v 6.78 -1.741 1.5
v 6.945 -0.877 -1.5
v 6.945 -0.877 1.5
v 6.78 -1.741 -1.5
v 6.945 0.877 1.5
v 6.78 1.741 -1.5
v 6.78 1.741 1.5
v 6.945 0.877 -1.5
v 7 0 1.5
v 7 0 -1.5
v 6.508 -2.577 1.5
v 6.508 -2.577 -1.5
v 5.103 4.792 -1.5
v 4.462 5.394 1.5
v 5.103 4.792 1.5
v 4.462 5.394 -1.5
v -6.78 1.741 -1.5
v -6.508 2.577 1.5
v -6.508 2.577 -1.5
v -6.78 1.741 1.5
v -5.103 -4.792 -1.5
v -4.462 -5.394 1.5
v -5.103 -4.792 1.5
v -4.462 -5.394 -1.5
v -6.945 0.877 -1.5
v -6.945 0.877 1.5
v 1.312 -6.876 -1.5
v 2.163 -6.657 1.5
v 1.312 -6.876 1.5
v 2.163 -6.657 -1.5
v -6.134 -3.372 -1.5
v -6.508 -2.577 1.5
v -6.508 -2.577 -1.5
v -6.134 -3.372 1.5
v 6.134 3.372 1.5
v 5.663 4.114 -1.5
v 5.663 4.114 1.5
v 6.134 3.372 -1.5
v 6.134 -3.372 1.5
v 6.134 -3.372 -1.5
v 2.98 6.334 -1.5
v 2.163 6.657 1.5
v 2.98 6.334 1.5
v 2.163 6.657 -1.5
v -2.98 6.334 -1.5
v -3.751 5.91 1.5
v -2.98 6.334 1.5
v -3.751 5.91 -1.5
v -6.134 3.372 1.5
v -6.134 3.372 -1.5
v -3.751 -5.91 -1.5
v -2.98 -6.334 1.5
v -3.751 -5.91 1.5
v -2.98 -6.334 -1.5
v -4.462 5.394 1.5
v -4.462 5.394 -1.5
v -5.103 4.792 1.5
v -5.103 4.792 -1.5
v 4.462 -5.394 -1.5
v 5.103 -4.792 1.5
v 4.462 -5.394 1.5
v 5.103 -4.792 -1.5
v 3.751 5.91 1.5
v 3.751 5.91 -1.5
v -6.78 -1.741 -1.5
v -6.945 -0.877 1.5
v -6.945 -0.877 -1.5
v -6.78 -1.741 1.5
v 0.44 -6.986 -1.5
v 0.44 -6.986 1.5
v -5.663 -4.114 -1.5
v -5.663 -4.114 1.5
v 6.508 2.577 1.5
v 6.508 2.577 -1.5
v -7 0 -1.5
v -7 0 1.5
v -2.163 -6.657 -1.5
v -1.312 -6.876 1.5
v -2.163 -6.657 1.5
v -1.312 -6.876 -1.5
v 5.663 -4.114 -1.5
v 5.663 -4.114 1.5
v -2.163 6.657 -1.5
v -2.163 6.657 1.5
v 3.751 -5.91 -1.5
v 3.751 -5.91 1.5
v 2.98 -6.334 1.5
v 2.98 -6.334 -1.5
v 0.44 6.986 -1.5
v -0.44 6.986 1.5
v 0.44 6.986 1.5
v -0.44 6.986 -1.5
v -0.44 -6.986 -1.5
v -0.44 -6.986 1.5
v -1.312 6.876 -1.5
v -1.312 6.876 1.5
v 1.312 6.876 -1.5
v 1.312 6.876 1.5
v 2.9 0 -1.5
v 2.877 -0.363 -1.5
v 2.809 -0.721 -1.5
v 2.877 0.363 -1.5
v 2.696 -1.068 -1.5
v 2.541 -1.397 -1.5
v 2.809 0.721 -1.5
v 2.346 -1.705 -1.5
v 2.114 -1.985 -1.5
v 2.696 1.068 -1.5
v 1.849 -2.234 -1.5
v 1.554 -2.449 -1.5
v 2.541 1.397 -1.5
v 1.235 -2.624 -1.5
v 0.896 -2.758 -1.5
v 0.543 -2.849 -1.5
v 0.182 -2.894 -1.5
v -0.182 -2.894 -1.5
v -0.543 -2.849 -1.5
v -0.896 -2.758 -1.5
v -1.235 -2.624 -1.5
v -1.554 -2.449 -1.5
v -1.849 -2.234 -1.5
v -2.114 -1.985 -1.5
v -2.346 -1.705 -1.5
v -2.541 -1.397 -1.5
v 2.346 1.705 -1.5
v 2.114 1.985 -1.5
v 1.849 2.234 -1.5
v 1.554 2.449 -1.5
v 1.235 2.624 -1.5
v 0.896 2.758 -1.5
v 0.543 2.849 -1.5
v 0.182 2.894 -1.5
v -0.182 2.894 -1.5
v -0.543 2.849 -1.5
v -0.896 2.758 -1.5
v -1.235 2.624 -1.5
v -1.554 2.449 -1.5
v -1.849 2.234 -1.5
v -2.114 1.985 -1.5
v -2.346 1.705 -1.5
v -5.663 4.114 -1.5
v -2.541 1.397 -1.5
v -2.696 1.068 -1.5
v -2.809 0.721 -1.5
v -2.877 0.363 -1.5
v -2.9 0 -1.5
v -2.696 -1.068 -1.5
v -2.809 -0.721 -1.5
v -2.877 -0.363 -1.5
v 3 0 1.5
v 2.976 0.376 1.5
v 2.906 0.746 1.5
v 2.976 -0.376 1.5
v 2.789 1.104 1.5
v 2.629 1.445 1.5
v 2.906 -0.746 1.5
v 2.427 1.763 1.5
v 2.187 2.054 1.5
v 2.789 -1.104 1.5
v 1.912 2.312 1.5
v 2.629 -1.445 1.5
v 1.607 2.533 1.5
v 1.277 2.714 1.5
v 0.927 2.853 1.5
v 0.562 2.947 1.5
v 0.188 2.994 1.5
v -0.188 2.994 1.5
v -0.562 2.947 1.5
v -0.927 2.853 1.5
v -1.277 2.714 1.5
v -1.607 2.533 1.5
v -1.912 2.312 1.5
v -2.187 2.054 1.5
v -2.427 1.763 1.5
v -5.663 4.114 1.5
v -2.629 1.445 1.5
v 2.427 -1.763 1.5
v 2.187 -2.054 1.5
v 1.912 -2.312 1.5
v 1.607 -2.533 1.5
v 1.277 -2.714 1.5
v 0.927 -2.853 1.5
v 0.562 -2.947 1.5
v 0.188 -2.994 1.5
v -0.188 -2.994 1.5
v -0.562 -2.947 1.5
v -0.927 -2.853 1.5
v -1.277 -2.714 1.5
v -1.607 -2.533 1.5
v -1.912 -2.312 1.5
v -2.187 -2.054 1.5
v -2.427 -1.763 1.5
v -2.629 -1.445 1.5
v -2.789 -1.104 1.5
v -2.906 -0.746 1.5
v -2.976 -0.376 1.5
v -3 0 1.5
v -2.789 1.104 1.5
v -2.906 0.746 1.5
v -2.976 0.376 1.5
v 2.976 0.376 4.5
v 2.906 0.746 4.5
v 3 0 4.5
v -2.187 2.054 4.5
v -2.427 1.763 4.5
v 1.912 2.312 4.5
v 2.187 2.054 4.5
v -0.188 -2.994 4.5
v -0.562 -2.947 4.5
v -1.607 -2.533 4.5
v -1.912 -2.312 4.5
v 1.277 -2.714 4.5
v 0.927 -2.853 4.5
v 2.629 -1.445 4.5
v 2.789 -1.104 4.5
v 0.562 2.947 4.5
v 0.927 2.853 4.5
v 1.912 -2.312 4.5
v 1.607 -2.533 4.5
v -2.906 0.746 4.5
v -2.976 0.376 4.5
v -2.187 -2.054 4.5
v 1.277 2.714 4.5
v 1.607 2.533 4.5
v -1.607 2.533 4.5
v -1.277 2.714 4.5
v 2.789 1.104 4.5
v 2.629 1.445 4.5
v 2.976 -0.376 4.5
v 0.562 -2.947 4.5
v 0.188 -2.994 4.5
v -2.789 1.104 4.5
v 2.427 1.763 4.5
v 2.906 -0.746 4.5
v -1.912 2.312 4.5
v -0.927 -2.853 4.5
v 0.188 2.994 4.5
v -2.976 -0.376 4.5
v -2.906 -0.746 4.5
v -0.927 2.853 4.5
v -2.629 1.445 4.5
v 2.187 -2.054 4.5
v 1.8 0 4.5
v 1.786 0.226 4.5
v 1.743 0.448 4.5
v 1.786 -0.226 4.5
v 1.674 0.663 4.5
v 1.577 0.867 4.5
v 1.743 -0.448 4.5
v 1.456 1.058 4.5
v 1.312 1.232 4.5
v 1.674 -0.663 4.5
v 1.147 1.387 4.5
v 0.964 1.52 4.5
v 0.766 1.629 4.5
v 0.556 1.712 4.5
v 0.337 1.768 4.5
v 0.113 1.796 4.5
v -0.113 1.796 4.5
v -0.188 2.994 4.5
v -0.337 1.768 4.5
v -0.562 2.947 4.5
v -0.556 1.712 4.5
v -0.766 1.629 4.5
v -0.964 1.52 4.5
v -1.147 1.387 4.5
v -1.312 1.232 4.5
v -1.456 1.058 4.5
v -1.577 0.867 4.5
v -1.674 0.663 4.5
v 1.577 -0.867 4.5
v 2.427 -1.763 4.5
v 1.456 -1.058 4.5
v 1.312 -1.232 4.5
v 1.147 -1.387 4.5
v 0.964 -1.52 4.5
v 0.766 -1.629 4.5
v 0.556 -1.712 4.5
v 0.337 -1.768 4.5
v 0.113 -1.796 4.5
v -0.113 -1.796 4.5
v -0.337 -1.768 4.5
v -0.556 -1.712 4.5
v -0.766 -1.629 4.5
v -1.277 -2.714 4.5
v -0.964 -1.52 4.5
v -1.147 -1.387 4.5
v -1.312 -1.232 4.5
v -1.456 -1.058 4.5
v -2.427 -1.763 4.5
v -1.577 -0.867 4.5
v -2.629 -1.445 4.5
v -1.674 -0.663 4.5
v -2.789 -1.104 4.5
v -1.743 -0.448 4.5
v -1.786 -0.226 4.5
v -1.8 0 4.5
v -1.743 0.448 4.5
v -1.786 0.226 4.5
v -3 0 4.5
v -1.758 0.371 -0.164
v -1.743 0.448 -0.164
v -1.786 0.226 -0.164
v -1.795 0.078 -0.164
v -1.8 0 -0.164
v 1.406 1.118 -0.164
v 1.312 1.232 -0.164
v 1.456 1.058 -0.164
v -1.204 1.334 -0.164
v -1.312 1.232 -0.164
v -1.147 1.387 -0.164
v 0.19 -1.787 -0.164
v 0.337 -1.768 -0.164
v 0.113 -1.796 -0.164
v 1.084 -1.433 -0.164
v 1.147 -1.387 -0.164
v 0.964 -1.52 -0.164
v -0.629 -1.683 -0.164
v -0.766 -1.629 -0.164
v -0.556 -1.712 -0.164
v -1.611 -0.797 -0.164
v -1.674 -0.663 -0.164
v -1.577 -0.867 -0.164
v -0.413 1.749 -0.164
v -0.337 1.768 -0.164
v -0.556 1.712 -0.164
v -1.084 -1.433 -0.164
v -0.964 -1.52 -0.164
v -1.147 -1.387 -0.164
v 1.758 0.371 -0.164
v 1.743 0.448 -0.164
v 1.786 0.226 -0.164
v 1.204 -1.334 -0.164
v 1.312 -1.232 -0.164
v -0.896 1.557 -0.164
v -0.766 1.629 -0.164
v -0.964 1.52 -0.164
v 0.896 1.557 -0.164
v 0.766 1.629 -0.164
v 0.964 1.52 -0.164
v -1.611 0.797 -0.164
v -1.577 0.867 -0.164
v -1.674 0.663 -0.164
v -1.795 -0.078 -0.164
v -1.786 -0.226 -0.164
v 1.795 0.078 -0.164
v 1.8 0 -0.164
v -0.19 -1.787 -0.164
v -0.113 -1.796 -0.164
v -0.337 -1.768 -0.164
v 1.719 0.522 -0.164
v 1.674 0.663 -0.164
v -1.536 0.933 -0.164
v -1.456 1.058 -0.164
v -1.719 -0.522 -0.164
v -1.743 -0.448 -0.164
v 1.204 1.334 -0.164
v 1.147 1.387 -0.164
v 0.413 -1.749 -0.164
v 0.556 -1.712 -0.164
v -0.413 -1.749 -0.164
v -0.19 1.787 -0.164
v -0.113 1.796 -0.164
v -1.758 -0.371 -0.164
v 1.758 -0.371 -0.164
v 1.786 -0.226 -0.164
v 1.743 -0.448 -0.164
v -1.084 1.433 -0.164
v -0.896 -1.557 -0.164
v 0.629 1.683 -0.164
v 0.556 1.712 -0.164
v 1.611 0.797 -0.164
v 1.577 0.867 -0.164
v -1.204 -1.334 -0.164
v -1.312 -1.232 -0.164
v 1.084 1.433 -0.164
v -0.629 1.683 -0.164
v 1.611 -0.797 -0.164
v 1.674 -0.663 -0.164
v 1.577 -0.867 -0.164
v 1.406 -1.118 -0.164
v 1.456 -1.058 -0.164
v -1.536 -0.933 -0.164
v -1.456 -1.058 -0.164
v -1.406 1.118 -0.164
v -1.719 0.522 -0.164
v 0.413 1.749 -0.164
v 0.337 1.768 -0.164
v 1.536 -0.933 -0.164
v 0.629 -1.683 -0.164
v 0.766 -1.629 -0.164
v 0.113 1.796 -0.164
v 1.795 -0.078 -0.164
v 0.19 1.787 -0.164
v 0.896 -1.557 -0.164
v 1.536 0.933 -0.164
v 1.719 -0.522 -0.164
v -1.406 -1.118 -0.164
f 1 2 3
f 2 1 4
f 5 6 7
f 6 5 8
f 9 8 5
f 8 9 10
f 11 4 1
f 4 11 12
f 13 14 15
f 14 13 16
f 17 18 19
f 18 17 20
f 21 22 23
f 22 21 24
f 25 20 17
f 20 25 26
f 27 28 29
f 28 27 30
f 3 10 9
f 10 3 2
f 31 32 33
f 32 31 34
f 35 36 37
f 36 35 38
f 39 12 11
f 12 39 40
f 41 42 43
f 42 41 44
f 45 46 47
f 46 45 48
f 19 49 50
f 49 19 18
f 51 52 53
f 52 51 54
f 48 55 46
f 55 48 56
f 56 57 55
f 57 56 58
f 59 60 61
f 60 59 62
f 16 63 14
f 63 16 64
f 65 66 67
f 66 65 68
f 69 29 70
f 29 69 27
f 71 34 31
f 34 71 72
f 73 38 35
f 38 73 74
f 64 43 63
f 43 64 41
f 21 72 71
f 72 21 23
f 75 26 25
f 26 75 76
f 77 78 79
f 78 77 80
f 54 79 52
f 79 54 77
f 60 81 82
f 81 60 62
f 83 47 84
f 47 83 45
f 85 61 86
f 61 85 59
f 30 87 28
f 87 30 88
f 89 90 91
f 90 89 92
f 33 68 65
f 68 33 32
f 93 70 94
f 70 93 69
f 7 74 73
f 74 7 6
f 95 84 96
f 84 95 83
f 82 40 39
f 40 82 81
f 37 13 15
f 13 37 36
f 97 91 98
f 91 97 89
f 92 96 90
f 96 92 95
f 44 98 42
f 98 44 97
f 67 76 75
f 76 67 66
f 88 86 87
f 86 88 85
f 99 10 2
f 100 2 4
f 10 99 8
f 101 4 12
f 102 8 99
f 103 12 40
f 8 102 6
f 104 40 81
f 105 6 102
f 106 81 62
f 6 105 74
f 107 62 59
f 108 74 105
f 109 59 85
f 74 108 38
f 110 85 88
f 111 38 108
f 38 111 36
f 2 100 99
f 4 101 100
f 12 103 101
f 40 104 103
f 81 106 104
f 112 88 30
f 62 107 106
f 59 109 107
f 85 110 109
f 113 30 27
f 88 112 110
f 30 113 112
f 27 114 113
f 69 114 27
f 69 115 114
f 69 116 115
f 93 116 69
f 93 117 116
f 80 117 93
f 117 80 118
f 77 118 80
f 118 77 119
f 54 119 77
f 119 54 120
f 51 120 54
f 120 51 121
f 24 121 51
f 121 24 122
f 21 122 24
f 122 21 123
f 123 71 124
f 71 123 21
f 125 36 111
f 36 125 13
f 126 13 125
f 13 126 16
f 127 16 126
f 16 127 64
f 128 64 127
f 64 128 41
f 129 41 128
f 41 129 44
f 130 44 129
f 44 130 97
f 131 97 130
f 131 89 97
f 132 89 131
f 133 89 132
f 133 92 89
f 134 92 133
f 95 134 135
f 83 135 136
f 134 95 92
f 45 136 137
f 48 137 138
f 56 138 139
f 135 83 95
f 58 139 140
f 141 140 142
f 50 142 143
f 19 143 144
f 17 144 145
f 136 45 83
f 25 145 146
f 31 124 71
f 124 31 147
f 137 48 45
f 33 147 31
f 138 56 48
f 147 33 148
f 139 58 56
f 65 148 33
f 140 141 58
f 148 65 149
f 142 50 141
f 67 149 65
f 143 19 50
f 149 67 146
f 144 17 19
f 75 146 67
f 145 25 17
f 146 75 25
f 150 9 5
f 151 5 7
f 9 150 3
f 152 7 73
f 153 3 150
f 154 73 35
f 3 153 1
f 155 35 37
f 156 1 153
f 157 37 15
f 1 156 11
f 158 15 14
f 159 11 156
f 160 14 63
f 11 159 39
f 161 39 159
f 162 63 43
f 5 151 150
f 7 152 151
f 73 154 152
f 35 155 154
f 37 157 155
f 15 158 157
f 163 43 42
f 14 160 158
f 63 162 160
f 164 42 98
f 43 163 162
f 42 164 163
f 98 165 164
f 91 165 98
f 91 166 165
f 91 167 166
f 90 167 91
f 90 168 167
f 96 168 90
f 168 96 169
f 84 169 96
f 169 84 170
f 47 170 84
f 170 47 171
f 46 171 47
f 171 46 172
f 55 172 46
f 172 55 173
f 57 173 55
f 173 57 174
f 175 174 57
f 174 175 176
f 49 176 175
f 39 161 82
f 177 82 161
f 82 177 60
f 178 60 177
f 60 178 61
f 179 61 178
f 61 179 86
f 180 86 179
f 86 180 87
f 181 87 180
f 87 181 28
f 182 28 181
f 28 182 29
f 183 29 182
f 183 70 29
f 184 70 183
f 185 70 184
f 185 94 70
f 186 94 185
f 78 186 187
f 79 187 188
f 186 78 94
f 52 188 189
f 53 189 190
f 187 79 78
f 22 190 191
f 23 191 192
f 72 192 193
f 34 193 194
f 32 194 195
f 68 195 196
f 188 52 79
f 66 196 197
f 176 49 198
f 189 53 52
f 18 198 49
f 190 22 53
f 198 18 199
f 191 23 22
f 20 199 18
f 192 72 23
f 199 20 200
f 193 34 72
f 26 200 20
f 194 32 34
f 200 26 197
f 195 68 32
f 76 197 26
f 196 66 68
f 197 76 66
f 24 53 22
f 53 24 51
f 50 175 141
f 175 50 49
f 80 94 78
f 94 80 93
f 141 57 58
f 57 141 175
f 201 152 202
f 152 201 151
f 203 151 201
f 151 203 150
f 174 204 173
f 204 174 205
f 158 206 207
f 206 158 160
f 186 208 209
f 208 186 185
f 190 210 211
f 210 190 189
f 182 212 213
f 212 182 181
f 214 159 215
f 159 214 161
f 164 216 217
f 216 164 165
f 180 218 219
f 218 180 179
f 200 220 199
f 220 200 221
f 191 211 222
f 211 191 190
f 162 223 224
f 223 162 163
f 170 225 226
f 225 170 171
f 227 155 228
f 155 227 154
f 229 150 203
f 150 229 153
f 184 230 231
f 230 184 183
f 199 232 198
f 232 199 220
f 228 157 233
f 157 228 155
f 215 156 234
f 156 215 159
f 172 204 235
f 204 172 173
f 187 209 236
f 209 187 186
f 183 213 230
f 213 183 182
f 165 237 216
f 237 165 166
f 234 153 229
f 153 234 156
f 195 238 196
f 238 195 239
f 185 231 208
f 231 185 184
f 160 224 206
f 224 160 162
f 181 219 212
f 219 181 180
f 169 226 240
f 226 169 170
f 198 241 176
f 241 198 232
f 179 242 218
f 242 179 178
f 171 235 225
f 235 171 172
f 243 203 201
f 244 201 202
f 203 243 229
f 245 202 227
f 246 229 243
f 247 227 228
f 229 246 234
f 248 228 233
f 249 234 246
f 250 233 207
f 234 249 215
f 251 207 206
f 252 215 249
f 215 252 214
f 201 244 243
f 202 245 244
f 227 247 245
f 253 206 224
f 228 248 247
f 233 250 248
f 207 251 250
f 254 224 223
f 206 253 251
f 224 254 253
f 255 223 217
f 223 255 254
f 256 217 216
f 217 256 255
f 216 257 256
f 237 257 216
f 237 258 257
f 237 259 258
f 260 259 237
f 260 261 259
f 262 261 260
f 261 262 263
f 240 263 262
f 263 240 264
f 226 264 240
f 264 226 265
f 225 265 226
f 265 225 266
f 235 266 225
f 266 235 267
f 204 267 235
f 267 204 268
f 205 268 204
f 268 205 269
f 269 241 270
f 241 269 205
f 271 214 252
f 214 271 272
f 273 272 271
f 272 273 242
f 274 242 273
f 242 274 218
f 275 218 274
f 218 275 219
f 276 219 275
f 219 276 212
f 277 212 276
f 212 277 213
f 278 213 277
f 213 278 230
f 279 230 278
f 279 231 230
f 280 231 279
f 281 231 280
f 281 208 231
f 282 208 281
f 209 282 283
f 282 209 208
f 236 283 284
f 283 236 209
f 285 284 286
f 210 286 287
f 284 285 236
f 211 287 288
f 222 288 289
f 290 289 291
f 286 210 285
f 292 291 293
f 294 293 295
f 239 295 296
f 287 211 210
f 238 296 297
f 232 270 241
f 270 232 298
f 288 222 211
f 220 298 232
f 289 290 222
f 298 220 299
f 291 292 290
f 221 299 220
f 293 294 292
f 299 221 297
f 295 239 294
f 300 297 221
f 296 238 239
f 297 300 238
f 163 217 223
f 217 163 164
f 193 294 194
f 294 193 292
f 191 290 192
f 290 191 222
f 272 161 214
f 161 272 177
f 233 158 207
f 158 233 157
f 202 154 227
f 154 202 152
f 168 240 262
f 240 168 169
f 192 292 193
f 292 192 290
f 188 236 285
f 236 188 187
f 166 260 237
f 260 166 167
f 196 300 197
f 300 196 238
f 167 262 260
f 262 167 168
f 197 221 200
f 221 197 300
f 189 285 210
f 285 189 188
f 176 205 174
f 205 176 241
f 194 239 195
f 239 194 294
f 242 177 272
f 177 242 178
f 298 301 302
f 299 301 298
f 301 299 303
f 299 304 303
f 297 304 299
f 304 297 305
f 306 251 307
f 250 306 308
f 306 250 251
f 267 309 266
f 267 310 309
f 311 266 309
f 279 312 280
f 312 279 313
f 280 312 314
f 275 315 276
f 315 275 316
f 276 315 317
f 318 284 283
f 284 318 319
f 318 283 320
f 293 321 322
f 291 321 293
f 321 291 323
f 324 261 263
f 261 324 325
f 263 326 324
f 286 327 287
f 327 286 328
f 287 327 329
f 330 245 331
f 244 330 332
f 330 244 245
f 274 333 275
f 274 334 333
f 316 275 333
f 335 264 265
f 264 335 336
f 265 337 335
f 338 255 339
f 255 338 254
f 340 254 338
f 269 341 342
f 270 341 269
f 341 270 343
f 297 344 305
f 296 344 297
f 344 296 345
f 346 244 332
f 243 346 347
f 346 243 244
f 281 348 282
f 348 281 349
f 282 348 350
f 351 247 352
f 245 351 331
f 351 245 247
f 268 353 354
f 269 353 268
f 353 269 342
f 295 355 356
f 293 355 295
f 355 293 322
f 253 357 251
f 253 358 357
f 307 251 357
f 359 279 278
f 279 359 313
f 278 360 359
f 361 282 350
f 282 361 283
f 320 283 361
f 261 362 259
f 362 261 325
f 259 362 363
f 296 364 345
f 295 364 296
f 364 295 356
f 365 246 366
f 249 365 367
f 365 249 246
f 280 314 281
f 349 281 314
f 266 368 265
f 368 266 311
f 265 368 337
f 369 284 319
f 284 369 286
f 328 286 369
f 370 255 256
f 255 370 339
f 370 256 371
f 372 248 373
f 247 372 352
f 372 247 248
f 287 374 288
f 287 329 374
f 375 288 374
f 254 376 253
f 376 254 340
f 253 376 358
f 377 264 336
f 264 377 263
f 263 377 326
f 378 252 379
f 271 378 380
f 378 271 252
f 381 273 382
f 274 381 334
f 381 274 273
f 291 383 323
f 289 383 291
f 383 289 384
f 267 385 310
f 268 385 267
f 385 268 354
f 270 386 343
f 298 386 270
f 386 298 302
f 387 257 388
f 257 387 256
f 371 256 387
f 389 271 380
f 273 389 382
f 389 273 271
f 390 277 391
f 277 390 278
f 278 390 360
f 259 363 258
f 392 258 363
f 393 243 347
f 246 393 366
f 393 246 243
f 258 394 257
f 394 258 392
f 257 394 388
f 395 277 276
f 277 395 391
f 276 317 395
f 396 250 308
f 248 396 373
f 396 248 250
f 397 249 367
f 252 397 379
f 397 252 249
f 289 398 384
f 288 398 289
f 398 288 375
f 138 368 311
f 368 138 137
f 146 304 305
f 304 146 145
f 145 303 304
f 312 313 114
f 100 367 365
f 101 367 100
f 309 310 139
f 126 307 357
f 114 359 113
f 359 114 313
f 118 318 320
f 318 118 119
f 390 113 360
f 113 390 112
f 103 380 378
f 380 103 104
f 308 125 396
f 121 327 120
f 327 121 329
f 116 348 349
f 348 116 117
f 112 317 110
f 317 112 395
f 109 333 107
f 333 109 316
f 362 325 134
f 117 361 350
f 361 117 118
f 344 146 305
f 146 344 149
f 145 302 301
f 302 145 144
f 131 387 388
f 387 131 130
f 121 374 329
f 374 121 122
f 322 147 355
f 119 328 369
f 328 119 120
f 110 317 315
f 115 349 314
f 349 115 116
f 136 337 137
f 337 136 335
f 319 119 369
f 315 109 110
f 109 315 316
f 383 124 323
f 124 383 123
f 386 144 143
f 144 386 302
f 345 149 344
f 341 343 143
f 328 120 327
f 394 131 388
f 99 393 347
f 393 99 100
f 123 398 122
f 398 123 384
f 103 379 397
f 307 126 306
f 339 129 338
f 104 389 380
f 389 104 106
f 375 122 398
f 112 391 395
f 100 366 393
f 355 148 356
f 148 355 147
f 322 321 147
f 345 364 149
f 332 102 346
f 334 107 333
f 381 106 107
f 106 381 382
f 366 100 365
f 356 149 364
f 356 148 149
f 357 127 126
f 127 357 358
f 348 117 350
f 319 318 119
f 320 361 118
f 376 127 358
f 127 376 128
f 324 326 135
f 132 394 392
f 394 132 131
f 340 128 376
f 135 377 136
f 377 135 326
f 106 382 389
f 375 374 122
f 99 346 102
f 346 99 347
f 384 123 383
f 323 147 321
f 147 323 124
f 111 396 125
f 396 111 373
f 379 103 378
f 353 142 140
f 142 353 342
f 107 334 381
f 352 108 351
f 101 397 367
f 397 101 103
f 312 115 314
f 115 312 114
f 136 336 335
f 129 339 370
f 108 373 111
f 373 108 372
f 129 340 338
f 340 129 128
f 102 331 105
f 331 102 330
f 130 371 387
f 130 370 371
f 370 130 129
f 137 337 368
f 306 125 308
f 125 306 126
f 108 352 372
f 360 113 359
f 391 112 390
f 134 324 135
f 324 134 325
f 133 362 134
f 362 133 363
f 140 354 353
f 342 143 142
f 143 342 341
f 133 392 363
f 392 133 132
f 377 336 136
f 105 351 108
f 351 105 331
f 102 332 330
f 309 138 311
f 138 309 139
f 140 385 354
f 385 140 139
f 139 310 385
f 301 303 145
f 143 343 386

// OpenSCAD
$fn = 50;


difference() {
	union() {
		translate(v = [0, 0, -1.5000000000]) {
			cylinder(h = 3, r = 7.0000000000);
		}
		translate(v = [0, 0, -1.5000000000]) {
			cylinder(h = 6, r = 3.0000000000);
		}
	}
	union() {
		translate(v = [0, 0, -1.5000000000]) {
			rotate(a = [0, 180, 0]) {
				difference() {
					union() {
						translate(v = [0, 0, -6.0000000000]) {
							cylinder(h = 6, r = 1.5000000000);
						}
						translate(v = [0, 0, -6.0000000000]) {
							cylinder(h = 6, r = 1.8000000000);
						}
						translate(v = [0, 0, -1.7000000000]) {
							cylinder(h = 1.7000000000, r1 = 1.5000000000, r2 = 2.9000000000);
						}
						translate(v = [0, 0, -6.0000000000]) {
							cylinder(h = 6, r = 1.5000000000);
						}
					}
					union();
				}
			}
		}
		translate(v = [0, 0, -50.0000000000]) {
			cylinder(h = 100, r = 1.5000000000);
		}
	}
}
